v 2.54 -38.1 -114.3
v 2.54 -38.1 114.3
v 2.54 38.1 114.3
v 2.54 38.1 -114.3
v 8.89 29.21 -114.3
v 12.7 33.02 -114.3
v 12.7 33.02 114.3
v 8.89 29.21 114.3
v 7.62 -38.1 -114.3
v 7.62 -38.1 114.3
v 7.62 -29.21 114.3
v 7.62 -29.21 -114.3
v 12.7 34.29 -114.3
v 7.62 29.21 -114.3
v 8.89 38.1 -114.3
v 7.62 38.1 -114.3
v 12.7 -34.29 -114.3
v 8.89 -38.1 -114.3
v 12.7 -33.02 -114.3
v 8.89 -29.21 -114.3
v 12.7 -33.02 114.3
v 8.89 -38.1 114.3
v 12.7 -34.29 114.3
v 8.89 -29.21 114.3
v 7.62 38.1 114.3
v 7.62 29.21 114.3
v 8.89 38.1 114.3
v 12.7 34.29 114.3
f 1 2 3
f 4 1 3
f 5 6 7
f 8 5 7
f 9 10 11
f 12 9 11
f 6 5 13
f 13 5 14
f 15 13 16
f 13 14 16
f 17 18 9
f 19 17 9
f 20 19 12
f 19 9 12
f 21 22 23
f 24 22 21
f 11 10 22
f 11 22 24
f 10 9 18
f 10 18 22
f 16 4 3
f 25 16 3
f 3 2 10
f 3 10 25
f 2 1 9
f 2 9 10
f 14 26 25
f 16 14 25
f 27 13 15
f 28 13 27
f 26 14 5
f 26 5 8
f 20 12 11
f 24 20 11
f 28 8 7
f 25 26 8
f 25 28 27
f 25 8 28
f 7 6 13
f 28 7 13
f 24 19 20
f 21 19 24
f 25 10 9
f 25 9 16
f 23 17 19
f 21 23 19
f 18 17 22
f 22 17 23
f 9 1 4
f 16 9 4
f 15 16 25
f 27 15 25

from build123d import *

# Parameters (mm, degrees)
F0_W      = 76.2
F0_H      = 228.6
F1_DEPTH  = 7.62
F2_W      = 8.89
F2_H      = 228.6
F3_DEPTH  = 5.08
F4_SIZE   = 3.81
F4_2_SIZE = 3.81
F5_DEPTH  = 2.54


with BuildPart() as f1:
    # F0 (on Right) → F1 (new body)
    with BuildSketch(Plane.YZ):
        Rectangle(F0_W, F0_H)
    extrude(amount=F1_DEPTH)

    # F5 (cut): a face of the model
    f5_faces = [f1.faces().sort_by_distance(p)[0] for p in [
        (0, 0, 0),
    ]]
    extrude(f5_faces, amount=-F5_DEPTH, mode=Mode.SUBTRACT)


with BuildPart() as f3:
    # F2 (on face) → F3 (new body)
    with BuildSketch(Plane.YZ.offset(7.62)):
        with Locations((-33.655, 0)):
            Rectangle(F2_W, F2_H)
    extrude(amount=F3_DEPTH)

    # F4
    f4_edges = [f3.edges().sort_by_distance(p)[0] for p in [
        (12.7, -38.1, 0),
        (12.7, -29.21, 0),
    ]]
    chamfer(f4_edges, length=F4_SIZE)


with BuildPart() as f3b:
    # F2 (on face) → F3, piece 2 (new body)
    with BuildSketch(Plane.YZ.offset(7.62)):
        with Locations((33.655, 0)):
            Rectangle(F2_W, F2_H)
    extrude(amount=F3_DEPTH)

    # F4#2
    f4_2_edges = [f3b.edges().sort_by_distance(p)[0] for p in [
        (12.7, 29.21, 0),
        (12.7, 38.1, 0),
    ]]
    chamfer(f4_2_edges, length=F4_2_SIZE)


solid = Compound([f1.part, f3.part, f3b.part])
